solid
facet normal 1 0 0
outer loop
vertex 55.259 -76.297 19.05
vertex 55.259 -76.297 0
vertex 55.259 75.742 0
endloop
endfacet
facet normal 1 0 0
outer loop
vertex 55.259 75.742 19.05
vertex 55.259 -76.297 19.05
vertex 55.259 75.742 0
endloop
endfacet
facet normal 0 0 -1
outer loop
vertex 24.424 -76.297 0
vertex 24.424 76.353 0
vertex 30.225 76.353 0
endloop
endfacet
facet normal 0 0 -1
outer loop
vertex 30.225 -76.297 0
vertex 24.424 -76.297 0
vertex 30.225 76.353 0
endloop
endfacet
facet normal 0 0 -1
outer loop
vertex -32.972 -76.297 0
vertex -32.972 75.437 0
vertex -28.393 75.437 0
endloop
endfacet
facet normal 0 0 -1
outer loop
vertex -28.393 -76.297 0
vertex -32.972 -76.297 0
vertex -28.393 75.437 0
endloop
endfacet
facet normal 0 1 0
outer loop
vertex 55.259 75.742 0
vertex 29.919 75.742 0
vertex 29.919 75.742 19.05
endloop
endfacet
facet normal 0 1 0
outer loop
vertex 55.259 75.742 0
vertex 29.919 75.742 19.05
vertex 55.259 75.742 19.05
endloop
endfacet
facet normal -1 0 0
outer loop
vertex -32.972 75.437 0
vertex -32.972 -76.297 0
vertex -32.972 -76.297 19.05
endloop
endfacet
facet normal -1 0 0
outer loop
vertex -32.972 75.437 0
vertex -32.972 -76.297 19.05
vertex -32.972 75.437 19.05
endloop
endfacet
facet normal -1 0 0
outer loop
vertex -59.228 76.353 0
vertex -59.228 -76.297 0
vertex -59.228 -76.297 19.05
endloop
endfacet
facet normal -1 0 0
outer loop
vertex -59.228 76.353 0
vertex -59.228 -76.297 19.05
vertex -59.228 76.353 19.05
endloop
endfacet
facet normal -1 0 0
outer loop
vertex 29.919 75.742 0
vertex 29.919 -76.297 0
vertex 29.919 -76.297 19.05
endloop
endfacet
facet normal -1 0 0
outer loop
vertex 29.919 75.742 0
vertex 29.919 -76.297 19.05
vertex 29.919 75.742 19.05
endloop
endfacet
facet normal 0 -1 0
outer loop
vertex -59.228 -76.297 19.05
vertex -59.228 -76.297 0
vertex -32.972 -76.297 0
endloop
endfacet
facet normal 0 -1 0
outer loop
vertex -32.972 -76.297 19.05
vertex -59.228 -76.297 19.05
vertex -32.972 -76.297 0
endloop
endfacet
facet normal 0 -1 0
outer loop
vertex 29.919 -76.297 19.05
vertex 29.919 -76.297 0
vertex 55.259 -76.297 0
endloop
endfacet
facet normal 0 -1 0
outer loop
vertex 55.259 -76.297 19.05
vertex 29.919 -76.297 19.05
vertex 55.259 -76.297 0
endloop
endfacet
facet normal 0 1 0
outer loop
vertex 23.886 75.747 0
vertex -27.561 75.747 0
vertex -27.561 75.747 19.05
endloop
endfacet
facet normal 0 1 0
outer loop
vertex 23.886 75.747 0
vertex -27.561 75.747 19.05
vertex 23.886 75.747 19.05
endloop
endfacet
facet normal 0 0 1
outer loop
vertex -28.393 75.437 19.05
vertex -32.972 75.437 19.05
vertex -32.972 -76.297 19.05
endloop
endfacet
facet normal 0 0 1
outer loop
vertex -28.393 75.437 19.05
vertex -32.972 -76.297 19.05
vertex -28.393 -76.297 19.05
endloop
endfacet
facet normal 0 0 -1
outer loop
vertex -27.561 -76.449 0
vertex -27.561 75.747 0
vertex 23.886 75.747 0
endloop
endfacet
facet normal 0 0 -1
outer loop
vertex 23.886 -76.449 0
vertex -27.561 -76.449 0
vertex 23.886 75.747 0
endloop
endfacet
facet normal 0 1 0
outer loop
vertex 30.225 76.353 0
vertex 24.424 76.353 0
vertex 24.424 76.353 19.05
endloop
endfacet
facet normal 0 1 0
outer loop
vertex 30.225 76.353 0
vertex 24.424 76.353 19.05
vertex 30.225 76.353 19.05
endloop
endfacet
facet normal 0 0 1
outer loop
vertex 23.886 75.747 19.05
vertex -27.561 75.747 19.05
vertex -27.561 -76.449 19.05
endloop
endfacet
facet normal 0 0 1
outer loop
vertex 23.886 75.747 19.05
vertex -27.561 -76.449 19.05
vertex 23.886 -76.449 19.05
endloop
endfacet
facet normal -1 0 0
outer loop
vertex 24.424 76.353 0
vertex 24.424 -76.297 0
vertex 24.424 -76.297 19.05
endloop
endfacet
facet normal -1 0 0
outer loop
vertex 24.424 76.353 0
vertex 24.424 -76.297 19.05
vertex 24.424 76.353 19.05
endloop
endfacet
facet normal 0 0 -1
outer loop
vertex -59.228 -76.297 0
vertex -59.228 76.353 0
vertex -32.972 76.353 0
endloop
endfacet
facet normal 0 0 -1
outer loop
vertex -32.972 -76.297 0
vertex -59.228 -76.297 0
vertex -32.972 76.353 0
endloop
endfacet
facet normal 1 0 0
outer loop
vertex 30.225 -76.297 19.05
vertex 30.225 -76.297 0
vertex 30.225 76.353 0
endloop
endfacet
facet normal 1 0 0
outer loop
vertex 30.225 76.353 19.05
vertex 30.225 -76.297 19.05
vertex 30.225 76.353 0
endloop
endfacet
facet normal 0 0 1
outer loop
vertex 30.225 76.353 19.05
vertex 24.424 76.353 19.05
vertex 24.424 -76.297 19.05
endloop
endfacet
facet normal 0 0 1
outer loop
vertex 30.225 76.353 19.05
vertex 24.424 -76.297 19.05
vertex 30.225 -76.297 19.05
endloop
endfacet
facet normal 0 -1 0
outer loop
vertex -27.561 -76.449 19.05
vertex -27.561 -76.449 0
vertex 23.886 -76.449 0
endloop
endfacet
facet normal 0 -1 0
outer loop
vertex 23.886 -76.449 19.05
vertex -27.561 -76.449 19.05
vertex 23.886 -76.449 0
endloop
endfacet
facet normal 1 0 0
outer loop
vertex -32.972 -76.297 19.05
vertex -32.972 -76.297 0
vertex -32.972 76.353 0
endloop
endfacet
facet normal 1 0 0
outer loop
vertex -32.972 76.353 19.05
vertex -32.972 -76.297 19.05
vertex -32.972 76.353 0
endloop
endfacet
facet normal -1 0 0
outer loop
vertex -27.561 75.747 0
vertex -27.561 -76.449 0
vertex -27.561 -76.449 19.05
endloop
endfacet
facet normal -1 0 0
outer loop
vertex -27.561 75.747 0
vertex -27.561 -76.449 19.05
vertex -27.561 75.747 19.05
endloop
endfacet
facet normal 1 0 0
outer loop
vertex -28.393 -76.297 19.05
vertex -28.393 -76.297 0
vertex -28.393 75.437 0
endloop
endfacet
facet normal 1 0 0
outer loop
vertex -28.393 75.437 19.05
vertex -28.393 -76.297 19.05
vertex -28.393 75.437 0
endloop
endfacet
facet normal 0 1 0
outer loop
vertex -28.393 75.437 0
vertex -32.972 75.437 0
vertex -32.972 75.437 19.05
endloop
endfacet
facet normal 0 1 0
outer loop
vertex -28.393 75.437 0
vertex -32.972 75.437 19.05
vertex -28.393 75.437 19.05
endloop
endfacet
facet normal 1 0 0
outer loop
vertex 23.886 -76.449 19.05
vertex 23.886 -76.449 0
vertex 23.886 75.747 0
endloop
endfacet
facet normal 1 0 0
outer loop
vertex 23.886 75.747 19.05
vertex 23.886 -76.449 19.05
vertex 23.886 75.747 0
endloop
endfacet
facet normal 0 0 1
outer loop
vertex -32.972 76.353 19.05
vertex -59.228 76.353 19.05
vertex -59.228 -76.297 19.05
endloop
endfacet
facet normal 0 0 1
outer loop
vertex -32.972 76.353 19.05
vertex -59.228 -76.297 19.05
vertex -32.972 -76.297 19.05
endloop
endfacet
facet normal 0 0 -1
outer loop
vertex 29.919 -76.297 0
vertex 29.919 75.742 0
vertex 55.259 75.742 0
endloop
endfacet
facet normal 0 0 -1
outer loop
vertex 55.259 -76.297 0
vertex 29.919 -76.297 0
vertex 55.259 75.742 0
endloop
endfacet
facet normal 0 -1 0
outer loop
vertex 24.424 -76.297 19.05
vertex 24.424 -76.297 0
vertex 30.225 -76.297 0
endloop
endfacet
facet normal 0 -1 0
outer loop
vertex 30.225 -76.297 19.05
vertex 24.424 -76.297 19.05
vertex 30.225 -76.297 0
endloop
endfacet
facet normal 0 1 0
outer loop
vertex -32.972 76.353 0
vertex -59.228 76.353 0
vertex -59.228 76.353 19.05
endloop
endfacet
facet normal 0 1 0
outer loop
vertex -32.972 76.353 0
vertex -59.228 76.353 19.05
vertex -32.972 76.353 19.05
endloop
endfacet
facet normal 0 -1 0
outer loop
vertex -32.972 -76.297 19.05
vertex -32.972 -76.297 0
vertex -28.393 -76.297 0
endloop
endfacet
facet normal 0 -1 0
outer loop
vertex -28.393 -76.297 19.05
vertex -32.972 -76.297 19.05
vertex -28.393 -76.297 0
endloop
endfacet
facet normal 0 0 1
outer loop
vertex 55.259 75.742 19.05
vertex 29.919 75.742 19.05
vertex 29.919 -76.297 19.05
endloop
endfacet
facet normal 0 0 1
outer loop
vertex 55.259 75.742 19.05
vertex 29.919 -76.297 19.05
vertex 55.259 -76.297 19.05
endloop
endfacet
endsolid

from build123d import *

# Parameters (mm, degrees)
F0_W     = 51.446718
F0_H     = 152.196549
F1_DEPTH = 19.05
F2_W     = 4.579483
F2_H     = 151.733495
F2_W_2   = 5.800676
F2_H_2   = 152.649395
F3_DEPTH = 19.05
F4_W     = 26.255693
F4_H     = 152.649395
F4_W_2   = 25.339797
F4_H_2   = 152.03879
F5_DEPTH = 19.05


with BuildPart() as f1:
    # F0 (on Top) → F1 (new body)
    with BuildSketch(Plane.XY):
        with Locations((-1.837384, -0.351112)):
            Rectangle(F0_W, F0_H)
    extrude(amount=F1_DEPTH)


with BuildPart() as f3:
    # F2 (on Top) → F3 (new body)
    with BuildSketch(Plane.XY):
        with Locations((-30.682527, -0.429991)):
            Rectangle(F2_W, F2_H)
        with Locations((27.324239, 0.027958)):
            Rectangle(F2_W_2, F2_H_2)
    extrude(amount=F3_DEPTH)


with BuildPart() as f5:
    # F4 (on Top) → F5 (new body)
    with BuildSketch(Plane.XY):
        with Locations((-46.100116, 0.027958)):
            Rectangle(F4_W, F4_H)
        with Locations((42.589176, -0.277344)):
            Rectangle(F4_W_2, F4_H_2)
    extrude(amount=F5_DEPTH)


solid = Compound([f1.part, f3.part, f5.part])
